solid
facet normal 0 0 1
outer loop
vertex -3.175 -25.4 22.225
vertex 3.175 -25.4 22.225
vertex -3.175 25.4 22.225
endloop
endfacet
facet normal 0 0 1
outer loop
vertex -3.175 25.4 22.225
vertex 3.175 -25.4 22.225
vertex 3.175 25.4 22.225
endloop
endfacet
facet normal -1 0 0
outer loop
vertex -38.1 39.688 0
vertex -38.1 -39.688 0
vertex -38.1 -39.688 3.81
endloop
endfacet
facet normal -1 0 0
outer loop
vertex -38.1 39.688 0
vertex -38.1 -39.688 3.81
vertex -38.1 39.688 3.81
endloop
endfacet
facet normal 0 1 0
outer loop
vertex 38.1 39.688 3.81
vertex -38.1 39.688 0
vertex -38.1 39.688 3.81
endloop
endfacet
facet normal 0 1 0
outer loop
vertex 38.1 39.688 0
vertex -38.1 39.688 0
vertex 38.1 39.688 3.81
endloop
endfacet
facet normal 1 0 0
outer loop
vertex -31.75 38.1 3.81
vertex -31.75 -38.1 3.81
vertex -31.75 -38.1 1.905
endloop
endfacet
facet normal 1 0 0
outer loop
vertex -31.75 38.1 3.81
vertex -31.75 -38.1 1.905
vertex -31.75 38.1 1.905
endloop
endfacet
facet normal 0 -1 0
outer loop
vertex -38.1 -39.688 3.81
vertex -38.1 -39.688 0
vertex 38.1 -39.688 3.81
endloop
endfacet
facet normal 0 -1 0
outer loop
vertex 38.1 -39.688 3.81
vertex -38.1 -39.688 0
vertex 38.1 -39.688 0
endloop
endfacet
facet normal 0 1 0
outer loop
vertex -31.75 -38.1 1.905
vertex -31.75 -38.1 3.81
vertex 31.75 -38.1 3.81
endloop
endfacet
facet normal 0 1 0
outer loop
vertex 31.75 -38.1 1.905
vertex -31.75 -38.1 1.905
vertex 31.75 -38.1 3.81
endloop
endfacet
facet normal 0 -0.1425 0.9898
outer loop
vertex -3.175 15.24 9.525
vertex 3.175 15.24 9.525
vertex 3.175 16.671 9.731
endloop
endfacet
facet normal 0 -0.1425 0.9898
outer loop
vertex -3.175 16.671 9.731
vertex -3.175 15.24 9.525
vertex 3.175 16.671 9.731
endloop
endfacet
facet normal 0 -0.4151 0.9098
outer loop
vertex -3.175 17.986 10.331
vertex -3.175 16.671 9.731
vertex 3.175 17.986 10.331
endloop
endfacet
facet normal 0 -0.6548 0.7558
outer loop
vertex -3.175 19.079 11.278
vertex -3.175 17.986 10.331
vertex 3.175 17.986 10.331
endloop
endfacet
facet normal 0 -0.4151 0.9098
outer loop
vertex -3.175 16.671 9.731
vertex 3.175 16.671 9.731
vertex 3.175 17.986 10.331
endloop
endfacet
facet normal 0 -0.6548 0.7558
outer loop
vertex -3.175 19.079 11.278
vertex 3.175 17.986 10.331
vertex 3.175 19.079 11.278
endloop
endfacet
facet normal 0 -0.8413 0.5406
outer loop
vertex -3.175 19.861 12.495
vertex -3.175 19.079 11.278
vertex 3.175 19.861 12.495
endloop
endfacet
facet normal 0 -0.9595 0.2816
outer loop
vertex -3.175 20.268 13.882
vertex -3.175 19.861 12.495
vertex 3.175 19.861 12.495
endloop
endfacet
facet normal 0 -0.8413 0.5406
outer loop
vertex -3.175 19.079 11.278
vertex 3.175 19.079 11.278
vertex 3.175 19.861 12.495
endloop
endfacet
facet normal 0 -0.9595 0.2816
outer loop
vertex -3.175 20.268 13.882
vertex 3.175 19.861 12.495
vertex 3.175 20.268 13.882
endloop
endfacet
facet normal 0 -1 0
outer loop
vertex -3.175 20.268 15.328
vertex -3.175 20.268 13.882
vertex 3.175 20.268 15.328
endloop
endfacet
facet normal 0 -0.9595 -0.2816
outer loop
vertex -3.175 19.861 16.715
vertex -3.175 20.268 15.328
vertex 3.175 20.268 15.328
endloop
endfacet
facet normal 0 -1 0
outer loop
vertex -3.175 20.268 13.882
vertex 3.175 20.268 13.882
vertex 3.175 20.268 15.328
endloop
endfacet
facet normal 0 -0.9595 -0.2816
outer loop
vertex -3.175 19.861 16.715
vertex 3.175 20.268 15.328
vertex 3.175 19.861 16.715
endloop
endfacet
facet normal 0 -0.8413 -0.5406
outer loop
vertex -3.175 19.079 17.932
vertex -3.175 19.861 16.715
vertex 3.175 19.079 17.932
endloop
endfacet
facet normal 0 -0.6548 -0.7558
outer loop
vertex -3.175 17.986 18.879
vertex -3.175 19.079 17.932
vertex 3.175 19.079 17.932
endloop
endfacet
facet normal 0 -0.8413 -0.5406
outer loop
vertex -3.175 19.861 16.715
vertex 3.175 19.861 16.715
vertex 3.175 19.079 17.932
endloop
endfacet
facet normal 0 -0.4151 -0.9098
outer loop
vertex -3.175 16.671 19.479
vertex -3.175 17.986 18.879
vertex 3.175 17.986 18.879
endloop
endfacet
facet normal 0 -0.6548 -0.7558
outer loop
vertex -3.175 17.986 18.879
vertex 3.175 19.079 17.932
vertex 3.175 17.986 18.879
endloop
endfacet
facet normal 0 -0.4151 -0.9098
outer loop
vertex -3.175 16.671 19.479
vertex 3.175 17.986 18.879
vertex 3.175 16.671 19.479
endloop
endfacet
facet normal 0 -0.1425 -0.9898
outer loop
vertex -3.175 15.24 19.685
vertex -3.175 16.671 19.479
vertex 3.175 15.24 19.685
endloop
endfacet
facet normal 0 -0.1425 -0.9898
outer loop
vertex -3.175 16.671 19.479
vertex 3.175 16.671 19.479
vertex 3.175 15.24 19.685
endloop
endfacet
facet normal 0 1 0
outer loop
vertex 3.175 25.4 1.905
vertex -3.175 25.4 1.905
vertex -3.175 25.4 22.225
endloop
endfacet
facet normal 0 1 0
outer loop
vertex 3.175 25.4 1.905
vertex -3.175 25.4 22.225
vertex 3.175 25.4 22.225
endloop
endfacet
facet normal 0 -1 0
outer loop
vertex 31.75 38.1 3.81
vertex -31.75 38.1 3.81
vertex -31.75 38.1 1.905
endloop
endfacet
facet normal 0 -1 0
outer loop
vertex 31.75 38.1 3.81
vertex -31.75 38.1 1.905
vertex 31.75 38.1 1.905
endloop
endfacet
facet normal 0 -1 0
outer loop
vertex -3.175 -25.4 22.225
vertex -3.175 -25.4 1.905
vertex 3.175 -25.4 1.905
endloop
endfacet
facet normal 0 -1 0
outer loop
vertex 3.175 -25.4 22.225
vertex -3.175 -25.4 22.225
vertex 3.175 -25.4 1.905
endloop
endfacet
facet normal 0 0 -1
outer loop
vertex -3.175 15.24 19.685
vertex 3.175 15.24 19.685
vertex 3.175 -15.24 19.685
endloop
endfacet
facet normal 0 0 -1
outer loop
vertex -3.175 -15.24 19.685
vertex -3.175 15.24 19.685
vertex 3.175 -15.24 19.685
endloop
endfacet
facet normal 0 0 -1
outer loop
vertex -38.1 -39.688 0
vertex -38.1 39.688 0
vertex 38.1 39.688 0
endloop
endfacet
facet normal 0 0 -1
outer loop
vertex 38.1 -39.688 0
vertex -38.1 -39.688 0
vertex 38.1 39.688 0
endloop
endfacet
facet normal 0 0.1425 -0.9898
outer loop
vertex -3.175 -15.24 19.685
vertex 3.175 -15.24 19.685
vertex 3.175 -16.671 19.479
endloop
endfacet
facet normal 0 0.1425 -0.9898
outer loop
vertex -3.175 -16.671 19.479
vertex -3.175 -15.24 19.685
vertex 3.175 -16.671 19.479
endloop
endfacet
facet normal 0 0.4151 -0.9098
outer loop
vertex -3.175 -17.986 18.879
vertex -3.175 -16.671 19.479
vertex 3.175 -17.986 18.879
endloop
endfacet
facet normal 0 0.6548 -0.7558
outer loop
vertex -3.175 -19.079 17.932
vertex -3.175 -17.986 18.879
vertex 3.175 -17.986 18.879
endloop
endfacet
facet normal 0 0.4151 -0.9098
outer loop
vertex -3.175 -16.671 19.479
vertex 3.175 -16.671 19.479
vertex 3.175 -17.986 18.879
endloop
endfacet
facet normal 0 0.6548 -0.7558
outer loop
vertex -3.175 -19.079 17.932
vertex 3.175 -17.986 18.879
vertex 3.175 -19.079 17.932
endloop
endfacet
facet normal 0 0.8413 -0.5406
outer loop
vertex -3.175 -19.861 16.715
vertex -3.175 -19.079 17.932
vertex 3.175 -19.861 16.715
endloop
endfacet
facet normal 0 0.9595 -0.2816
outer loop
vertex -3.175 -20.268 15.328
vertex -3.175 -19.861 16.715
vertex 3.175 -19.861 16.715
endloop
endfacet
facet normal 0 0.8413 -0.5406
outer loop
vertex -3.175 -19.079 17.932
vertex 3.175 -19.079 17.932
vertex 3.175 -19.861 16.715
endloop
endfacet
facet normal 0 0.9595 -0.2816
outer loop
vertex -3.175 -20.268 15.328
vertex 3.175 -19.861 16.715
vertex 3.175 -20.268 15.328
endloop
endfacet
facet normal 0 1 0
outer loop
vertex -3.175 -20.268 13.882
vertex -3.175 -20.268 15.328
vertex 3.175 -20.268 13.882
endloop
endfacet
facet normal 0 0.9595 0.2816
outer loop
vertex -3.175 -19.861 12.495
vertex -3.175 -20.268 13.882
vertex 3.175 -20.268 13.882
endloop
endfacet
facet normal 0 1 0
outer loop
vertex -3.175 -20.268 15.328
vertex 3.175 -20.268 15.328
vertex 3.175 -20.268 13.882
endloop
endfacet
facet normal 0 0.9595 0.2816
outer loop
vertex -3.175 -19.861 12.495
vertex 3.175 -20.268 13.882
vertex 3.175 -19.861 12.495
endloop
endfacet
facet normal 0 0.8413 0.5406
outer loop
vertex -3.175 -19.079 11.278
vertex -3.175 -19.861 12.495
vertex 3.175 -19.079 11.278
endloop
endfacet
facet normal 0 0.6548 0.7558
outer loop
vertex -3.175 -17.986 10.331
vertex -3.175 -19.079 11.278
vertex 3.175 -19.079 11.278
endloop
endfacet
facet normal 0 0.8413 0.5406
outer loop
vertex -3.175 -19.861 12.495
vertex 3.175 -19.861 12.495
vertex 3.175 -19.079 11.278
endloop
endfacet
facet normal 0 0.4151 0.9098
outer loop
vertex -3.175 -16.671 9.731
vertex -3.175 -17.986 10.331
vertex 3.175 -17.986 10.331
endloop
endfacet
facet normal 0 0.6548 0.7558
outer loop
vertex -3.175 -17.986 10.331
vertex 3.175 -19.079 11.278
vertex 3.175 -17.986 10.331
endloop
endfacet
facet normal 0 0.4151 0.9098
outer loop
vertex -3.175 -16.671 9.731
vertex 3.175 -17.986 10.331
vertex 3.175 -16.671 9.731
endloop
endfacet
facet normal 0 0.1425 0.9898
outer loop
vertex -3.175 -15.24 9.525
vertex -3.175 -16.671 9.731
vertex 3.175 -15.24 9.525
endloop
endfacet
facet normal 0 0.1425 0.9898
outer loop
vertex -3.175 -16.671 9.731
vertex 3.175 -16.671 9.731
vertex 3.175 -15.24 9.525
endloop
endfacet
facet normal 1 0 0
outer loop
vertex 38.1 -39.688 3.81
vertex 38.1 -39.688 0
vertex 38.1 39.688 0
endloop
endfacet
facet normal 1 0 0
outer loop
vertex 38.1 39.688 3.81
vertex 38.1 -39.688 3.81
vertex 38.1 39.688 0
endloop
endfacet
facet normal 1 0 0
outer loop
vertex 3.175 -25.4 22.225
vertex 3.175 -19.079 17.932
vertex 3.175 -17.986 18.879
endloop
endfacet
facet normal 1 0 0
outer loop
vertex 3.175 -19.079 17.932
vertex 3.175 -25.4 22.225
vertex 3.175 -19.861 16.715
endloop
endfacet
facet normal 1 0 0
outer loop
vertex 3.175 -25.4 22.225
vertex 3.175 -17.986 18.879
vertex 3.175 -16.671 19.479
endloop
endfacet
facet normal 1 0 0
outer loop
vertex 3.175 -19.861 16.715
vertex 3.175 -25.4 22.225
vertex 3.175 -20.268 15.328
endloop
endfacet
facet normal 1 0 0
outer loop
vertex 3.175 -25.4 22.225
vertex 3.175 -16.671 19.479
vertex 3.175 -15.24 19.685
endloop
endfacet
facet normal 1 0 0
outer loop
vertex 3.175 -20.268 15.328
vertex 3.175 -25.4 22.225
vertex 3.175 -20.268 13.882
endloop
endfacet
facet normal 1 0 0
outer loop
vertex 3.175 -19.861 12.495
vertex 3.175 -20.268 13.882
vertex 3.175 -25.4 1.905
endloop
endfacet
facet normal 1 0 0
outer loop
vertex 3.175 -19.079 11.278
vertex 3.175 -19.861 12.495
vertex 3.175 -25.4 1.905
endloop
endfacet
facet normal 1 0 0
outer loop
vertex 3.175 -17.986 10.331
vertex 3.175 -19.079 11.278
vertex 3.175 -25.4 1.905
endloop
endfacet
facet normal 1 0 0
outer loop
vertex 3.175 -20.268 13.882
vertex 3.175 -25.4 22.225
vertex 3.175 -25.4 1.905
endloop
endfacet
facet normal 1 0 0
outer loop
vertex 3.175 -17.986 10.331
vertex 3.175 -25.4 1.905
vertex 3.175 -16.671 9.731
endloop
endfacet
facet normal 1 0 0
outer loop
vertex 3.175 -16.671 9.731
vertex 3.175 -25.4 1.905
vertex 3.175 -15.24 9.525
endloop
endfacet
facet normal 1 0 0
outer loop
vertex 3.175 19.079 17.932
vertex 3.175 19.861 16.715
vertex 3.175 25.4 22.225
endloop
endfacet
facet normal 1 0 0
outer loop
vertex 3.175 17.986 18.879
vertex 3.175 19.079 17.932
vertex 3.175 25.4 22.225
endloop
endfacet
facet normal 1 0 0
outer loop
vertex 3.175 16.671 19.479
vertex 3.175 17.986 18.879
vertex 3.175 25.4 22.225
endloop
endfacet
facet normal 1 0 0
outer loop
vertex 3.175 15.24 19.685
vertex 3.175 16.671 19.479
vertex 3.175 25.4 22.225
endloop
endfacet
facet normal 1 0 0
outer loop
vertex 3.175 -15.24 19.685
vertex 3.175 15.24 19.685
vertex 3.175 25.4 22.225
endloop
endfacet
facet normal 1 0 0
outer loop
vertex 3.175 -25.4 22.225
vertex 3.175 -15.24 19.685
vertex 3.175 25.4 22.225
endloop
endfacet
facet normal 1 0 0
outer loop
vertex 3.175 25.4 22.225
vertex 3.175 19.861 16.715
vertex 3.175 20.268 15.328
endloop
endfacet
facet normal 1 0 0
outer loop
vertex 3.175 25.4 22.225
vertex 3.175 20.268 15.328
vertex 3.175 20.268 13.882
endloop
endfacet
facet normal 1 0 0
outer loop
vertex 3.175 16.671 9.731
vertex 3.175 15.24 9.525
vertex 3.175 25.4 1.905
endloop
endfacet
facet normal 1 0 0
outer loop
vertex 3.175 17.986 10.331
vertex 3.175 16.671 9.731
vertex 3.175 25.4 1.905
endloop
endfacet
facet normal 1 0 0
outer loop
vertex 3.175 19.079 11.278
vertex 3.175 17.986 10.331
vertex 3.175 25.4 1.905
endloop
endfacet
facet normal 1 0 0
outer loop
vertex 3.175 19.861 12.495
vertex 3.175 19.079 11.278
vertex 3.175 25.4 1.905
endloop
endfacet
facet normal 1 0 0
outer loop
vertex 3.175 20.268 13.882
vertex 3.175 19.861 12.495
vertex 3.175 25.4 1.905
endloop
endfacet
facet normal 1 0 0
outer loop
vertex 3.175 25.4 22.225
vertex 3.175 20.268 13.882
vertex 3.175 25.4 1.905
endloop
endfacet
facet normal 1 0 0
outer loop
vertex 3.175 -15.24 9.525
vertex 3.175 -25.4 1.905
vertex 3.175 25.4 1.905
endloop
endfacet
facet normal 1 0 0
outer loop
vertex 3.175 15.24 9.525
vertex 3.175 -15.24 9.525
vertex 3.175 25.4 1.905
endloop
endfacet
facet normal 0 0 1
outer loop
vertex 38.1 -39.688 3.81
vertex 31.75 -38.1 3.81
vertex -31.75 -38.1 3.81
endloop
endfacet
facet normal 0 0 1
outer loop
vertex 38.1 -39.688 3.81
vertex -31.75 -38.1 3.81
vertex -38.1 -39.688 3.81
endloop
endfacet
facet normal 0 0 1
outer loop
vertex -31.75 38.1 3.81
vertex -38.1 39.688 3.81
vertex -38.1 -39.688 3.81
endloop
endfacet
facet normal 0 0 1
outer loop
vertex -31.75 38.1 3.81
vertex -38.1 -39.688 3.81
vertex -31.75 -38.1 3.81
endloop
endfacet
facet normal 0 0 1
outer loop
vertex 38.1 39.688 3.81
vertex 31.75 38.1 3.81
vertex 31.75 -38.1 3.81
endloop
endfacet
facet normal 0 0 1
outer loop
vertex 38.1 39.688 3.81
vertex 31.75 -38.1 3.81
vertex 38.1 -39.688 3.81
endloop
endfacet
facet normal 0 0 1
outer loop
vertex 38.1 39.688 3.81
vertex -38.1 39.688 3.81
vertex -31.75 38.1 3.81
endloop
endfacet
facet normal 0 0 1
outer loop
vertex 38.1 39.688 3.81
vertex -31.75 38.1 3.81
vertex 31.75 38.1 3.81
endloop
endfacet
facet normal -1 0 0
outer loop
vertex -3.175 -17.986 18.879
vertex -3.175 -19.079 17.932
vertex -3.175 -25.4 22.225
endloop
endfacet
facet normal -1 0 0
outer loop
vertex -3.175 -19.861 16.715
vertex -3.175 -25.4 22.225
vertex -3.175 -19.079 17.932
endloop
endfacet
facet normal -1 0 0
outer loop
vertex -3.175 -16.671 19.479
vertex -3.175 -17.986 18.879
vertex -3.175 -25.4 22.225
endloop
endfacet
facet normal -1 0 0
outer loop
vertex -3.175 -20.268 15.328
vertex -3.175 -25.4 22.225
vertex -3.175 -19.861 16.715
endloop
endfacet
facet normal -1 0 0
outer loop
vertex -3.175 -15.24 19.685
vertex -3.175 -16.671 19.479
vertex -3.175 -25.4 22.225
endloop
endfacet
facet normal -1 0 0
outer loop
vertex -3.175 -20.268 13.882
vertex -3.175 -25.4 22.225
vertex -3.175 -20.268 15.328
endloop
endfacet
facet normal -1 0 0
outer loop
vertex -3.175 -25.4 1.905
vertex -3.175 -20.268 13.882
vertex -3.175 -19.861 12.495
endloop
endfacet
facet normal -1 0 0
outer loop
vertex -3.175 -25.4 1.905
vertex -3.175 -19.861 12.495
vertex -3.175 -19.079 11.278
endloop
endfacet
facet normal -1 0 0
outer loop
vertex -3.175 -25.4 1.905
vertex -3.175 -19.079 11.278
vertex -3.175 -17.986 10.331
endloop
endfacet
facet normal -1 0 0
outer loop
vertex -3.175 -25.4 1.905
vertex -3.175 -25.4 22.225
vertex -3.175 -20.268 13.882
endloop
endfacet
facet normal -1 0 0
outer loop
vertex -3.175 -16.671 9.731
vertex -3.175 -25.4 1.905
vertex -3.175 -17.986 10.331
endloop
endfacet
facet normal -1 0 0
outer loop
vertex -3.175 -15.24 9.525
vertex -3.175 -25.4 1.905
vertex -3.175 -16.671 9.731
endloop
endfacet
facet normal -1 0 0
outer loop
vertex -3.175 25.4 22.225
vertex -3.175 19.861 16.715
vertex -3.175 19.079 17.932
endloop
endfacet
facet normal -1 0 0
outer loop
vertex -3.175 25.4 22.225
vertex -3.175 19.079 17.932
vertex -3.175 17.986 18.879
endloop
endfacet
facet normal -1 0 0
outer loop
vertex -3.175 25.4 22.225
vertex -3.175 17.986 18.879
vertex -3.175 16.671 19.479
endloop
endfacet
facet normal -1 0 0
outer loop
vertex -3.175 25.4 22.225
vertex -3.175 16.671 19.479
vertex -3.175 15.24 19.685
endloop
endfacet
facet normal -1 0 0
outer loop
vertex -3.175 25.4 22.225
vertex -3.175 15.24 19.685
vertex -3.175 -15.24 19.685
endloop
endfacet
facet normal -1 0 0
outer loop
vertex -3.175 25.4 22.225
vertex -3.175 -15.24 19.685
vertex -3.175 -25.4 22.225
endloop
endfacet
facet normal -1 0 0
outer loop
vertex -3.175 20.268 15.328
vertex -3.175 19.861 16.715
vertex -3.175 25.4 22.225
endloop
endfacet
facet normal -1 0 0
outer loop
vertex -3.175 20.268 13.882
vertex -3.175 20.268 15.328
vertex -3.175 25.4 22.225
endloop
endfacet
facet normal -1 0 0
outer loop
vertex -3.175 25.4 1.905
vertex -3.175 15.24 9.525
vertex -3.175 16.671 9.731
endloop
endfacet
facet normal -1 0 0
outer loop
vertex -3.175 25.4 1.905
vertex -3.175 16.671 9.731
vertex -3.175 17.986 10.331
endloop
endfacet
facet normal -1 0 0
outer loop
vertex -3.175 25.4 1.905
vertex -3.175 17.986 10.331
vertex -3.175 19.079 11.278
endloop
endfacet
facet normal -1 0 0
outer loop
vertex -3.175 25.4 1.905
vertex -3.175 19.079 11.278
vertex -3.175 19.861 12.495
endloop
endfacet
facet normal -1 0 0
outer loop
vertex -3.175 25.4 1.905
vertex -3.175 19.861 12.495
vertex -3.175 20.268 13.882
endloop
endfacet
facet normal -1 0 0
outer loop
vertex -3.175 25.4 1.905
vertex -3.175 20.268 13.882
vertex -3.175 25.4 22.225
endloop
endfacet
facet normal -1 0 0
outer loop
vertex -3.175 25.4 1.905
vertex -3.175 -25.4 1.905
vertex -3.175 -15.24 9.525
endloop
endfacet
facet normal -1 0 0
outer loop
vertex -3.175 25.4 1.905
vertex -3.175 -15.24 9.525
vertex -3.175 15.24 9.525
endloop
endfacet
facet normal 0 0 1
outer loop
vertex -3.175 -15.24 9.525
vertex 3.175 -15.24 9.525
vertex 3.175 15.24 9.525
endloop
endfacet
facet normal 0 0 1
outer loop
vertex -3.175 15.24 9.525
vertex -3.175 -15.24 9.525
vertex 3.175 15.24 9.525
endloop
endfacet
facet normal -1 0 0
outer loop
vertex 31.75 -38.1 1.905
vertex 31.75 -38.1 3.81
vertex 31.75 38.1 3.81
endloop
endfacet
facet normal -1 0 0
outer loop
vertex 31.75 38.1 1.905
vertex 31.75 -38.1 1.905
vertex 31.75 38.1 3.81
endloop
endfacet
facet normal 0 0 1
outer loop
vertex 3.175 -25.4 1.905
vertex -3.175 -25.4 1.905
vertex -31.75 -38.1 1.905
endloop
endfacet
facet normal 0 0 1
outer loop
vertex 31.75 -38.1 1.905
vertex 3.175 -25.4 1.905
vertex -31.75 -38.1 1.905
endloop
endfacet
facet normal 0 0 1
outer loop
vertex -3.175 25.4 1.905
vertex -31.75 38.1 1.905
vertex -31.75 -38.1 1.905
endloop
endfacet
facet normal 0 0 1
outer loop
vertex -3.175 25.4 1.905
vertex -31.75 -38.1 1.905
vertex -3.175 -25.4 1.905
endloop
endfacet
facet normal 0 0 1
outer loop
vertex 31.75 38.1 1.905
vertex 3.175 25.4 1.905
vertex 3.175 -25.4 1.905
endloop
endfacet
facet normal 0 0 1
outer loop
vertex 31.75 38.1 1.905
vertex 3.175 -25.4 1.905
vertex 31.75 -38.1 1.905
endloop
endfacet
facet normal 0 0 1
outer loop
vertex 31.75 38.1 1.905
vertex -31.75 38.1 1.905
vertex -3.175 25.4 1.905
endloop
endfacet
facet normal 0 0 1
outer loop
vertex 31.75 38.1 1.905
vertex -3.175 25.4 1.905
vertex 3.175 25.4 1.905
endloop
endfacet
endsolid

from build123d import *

# Parameters (mm, degrees)
F0_W     = 76.2
F0_H     = 79.375
F1_DEPTH = 3.81
F2_W     = 63.5
F2_H     = 76.2
F3_DEPTH = 1.905
F4_W     = 6.35
F4_H     = 50.8
F5_DEPTH = 25.4
F7_DEPTH = 25.4
F8_W     = 50.8
F8_H     = 5.08
F9_DEPTH = 25.4


with BuildPart() as f1:
    # F0 (on Top) → F1 (new body)
    with BuildSketch(Plane.XY):
        Rectangle(F0_W, F0_H)
    extrude(amount=F1_DEPTH)

    # F2 (on face) → F3 (cut)
    with BuildSketch(Plane.XY.offset(3.81)):
        Rectangle(F2_W, F2_H)
    extrude(amount=-F3_DEPTH, mode=Mode.SUBTRACT)

    # F4 (on face) → F5 (join)
    with BuildSketch(Plane.XY.offset(1.905)):
        Rectangle(F4_W, F4_H)
    extrude(amount=F5_DEPTH)

    # F6 (on face) → F7 (cut)
    with BuildSketch(Plane.YZ.offset(3.175)):
        with BuildLine():
            ThreePointArc((15.24, 9.525), (20.32, 14.605), (15.24, 19.685))
            Line((15.24, 19.685), (-15.24, 19.685))
            ThreePointArc((-15.24, 19.685), (-20.32, 14.605), (-15.24, 9.525))
            Line((-15.24, 9.525), (15.24, 9.525))
        make_face()
    extrude(amount=-F7_DEPTH, mode=Mode.SUBTRACT)

    # F8 (on face) → F9 (cut)
    with BuildSketch(Plane.YZ.offset(3.175)):
        with Locations((0, 24.765)):
            Rectangle(F8_W, F8_H)
    extrude(amount=-F9_DEPTH, mode=Mode.SUBTRACT)


solid = f1.part
